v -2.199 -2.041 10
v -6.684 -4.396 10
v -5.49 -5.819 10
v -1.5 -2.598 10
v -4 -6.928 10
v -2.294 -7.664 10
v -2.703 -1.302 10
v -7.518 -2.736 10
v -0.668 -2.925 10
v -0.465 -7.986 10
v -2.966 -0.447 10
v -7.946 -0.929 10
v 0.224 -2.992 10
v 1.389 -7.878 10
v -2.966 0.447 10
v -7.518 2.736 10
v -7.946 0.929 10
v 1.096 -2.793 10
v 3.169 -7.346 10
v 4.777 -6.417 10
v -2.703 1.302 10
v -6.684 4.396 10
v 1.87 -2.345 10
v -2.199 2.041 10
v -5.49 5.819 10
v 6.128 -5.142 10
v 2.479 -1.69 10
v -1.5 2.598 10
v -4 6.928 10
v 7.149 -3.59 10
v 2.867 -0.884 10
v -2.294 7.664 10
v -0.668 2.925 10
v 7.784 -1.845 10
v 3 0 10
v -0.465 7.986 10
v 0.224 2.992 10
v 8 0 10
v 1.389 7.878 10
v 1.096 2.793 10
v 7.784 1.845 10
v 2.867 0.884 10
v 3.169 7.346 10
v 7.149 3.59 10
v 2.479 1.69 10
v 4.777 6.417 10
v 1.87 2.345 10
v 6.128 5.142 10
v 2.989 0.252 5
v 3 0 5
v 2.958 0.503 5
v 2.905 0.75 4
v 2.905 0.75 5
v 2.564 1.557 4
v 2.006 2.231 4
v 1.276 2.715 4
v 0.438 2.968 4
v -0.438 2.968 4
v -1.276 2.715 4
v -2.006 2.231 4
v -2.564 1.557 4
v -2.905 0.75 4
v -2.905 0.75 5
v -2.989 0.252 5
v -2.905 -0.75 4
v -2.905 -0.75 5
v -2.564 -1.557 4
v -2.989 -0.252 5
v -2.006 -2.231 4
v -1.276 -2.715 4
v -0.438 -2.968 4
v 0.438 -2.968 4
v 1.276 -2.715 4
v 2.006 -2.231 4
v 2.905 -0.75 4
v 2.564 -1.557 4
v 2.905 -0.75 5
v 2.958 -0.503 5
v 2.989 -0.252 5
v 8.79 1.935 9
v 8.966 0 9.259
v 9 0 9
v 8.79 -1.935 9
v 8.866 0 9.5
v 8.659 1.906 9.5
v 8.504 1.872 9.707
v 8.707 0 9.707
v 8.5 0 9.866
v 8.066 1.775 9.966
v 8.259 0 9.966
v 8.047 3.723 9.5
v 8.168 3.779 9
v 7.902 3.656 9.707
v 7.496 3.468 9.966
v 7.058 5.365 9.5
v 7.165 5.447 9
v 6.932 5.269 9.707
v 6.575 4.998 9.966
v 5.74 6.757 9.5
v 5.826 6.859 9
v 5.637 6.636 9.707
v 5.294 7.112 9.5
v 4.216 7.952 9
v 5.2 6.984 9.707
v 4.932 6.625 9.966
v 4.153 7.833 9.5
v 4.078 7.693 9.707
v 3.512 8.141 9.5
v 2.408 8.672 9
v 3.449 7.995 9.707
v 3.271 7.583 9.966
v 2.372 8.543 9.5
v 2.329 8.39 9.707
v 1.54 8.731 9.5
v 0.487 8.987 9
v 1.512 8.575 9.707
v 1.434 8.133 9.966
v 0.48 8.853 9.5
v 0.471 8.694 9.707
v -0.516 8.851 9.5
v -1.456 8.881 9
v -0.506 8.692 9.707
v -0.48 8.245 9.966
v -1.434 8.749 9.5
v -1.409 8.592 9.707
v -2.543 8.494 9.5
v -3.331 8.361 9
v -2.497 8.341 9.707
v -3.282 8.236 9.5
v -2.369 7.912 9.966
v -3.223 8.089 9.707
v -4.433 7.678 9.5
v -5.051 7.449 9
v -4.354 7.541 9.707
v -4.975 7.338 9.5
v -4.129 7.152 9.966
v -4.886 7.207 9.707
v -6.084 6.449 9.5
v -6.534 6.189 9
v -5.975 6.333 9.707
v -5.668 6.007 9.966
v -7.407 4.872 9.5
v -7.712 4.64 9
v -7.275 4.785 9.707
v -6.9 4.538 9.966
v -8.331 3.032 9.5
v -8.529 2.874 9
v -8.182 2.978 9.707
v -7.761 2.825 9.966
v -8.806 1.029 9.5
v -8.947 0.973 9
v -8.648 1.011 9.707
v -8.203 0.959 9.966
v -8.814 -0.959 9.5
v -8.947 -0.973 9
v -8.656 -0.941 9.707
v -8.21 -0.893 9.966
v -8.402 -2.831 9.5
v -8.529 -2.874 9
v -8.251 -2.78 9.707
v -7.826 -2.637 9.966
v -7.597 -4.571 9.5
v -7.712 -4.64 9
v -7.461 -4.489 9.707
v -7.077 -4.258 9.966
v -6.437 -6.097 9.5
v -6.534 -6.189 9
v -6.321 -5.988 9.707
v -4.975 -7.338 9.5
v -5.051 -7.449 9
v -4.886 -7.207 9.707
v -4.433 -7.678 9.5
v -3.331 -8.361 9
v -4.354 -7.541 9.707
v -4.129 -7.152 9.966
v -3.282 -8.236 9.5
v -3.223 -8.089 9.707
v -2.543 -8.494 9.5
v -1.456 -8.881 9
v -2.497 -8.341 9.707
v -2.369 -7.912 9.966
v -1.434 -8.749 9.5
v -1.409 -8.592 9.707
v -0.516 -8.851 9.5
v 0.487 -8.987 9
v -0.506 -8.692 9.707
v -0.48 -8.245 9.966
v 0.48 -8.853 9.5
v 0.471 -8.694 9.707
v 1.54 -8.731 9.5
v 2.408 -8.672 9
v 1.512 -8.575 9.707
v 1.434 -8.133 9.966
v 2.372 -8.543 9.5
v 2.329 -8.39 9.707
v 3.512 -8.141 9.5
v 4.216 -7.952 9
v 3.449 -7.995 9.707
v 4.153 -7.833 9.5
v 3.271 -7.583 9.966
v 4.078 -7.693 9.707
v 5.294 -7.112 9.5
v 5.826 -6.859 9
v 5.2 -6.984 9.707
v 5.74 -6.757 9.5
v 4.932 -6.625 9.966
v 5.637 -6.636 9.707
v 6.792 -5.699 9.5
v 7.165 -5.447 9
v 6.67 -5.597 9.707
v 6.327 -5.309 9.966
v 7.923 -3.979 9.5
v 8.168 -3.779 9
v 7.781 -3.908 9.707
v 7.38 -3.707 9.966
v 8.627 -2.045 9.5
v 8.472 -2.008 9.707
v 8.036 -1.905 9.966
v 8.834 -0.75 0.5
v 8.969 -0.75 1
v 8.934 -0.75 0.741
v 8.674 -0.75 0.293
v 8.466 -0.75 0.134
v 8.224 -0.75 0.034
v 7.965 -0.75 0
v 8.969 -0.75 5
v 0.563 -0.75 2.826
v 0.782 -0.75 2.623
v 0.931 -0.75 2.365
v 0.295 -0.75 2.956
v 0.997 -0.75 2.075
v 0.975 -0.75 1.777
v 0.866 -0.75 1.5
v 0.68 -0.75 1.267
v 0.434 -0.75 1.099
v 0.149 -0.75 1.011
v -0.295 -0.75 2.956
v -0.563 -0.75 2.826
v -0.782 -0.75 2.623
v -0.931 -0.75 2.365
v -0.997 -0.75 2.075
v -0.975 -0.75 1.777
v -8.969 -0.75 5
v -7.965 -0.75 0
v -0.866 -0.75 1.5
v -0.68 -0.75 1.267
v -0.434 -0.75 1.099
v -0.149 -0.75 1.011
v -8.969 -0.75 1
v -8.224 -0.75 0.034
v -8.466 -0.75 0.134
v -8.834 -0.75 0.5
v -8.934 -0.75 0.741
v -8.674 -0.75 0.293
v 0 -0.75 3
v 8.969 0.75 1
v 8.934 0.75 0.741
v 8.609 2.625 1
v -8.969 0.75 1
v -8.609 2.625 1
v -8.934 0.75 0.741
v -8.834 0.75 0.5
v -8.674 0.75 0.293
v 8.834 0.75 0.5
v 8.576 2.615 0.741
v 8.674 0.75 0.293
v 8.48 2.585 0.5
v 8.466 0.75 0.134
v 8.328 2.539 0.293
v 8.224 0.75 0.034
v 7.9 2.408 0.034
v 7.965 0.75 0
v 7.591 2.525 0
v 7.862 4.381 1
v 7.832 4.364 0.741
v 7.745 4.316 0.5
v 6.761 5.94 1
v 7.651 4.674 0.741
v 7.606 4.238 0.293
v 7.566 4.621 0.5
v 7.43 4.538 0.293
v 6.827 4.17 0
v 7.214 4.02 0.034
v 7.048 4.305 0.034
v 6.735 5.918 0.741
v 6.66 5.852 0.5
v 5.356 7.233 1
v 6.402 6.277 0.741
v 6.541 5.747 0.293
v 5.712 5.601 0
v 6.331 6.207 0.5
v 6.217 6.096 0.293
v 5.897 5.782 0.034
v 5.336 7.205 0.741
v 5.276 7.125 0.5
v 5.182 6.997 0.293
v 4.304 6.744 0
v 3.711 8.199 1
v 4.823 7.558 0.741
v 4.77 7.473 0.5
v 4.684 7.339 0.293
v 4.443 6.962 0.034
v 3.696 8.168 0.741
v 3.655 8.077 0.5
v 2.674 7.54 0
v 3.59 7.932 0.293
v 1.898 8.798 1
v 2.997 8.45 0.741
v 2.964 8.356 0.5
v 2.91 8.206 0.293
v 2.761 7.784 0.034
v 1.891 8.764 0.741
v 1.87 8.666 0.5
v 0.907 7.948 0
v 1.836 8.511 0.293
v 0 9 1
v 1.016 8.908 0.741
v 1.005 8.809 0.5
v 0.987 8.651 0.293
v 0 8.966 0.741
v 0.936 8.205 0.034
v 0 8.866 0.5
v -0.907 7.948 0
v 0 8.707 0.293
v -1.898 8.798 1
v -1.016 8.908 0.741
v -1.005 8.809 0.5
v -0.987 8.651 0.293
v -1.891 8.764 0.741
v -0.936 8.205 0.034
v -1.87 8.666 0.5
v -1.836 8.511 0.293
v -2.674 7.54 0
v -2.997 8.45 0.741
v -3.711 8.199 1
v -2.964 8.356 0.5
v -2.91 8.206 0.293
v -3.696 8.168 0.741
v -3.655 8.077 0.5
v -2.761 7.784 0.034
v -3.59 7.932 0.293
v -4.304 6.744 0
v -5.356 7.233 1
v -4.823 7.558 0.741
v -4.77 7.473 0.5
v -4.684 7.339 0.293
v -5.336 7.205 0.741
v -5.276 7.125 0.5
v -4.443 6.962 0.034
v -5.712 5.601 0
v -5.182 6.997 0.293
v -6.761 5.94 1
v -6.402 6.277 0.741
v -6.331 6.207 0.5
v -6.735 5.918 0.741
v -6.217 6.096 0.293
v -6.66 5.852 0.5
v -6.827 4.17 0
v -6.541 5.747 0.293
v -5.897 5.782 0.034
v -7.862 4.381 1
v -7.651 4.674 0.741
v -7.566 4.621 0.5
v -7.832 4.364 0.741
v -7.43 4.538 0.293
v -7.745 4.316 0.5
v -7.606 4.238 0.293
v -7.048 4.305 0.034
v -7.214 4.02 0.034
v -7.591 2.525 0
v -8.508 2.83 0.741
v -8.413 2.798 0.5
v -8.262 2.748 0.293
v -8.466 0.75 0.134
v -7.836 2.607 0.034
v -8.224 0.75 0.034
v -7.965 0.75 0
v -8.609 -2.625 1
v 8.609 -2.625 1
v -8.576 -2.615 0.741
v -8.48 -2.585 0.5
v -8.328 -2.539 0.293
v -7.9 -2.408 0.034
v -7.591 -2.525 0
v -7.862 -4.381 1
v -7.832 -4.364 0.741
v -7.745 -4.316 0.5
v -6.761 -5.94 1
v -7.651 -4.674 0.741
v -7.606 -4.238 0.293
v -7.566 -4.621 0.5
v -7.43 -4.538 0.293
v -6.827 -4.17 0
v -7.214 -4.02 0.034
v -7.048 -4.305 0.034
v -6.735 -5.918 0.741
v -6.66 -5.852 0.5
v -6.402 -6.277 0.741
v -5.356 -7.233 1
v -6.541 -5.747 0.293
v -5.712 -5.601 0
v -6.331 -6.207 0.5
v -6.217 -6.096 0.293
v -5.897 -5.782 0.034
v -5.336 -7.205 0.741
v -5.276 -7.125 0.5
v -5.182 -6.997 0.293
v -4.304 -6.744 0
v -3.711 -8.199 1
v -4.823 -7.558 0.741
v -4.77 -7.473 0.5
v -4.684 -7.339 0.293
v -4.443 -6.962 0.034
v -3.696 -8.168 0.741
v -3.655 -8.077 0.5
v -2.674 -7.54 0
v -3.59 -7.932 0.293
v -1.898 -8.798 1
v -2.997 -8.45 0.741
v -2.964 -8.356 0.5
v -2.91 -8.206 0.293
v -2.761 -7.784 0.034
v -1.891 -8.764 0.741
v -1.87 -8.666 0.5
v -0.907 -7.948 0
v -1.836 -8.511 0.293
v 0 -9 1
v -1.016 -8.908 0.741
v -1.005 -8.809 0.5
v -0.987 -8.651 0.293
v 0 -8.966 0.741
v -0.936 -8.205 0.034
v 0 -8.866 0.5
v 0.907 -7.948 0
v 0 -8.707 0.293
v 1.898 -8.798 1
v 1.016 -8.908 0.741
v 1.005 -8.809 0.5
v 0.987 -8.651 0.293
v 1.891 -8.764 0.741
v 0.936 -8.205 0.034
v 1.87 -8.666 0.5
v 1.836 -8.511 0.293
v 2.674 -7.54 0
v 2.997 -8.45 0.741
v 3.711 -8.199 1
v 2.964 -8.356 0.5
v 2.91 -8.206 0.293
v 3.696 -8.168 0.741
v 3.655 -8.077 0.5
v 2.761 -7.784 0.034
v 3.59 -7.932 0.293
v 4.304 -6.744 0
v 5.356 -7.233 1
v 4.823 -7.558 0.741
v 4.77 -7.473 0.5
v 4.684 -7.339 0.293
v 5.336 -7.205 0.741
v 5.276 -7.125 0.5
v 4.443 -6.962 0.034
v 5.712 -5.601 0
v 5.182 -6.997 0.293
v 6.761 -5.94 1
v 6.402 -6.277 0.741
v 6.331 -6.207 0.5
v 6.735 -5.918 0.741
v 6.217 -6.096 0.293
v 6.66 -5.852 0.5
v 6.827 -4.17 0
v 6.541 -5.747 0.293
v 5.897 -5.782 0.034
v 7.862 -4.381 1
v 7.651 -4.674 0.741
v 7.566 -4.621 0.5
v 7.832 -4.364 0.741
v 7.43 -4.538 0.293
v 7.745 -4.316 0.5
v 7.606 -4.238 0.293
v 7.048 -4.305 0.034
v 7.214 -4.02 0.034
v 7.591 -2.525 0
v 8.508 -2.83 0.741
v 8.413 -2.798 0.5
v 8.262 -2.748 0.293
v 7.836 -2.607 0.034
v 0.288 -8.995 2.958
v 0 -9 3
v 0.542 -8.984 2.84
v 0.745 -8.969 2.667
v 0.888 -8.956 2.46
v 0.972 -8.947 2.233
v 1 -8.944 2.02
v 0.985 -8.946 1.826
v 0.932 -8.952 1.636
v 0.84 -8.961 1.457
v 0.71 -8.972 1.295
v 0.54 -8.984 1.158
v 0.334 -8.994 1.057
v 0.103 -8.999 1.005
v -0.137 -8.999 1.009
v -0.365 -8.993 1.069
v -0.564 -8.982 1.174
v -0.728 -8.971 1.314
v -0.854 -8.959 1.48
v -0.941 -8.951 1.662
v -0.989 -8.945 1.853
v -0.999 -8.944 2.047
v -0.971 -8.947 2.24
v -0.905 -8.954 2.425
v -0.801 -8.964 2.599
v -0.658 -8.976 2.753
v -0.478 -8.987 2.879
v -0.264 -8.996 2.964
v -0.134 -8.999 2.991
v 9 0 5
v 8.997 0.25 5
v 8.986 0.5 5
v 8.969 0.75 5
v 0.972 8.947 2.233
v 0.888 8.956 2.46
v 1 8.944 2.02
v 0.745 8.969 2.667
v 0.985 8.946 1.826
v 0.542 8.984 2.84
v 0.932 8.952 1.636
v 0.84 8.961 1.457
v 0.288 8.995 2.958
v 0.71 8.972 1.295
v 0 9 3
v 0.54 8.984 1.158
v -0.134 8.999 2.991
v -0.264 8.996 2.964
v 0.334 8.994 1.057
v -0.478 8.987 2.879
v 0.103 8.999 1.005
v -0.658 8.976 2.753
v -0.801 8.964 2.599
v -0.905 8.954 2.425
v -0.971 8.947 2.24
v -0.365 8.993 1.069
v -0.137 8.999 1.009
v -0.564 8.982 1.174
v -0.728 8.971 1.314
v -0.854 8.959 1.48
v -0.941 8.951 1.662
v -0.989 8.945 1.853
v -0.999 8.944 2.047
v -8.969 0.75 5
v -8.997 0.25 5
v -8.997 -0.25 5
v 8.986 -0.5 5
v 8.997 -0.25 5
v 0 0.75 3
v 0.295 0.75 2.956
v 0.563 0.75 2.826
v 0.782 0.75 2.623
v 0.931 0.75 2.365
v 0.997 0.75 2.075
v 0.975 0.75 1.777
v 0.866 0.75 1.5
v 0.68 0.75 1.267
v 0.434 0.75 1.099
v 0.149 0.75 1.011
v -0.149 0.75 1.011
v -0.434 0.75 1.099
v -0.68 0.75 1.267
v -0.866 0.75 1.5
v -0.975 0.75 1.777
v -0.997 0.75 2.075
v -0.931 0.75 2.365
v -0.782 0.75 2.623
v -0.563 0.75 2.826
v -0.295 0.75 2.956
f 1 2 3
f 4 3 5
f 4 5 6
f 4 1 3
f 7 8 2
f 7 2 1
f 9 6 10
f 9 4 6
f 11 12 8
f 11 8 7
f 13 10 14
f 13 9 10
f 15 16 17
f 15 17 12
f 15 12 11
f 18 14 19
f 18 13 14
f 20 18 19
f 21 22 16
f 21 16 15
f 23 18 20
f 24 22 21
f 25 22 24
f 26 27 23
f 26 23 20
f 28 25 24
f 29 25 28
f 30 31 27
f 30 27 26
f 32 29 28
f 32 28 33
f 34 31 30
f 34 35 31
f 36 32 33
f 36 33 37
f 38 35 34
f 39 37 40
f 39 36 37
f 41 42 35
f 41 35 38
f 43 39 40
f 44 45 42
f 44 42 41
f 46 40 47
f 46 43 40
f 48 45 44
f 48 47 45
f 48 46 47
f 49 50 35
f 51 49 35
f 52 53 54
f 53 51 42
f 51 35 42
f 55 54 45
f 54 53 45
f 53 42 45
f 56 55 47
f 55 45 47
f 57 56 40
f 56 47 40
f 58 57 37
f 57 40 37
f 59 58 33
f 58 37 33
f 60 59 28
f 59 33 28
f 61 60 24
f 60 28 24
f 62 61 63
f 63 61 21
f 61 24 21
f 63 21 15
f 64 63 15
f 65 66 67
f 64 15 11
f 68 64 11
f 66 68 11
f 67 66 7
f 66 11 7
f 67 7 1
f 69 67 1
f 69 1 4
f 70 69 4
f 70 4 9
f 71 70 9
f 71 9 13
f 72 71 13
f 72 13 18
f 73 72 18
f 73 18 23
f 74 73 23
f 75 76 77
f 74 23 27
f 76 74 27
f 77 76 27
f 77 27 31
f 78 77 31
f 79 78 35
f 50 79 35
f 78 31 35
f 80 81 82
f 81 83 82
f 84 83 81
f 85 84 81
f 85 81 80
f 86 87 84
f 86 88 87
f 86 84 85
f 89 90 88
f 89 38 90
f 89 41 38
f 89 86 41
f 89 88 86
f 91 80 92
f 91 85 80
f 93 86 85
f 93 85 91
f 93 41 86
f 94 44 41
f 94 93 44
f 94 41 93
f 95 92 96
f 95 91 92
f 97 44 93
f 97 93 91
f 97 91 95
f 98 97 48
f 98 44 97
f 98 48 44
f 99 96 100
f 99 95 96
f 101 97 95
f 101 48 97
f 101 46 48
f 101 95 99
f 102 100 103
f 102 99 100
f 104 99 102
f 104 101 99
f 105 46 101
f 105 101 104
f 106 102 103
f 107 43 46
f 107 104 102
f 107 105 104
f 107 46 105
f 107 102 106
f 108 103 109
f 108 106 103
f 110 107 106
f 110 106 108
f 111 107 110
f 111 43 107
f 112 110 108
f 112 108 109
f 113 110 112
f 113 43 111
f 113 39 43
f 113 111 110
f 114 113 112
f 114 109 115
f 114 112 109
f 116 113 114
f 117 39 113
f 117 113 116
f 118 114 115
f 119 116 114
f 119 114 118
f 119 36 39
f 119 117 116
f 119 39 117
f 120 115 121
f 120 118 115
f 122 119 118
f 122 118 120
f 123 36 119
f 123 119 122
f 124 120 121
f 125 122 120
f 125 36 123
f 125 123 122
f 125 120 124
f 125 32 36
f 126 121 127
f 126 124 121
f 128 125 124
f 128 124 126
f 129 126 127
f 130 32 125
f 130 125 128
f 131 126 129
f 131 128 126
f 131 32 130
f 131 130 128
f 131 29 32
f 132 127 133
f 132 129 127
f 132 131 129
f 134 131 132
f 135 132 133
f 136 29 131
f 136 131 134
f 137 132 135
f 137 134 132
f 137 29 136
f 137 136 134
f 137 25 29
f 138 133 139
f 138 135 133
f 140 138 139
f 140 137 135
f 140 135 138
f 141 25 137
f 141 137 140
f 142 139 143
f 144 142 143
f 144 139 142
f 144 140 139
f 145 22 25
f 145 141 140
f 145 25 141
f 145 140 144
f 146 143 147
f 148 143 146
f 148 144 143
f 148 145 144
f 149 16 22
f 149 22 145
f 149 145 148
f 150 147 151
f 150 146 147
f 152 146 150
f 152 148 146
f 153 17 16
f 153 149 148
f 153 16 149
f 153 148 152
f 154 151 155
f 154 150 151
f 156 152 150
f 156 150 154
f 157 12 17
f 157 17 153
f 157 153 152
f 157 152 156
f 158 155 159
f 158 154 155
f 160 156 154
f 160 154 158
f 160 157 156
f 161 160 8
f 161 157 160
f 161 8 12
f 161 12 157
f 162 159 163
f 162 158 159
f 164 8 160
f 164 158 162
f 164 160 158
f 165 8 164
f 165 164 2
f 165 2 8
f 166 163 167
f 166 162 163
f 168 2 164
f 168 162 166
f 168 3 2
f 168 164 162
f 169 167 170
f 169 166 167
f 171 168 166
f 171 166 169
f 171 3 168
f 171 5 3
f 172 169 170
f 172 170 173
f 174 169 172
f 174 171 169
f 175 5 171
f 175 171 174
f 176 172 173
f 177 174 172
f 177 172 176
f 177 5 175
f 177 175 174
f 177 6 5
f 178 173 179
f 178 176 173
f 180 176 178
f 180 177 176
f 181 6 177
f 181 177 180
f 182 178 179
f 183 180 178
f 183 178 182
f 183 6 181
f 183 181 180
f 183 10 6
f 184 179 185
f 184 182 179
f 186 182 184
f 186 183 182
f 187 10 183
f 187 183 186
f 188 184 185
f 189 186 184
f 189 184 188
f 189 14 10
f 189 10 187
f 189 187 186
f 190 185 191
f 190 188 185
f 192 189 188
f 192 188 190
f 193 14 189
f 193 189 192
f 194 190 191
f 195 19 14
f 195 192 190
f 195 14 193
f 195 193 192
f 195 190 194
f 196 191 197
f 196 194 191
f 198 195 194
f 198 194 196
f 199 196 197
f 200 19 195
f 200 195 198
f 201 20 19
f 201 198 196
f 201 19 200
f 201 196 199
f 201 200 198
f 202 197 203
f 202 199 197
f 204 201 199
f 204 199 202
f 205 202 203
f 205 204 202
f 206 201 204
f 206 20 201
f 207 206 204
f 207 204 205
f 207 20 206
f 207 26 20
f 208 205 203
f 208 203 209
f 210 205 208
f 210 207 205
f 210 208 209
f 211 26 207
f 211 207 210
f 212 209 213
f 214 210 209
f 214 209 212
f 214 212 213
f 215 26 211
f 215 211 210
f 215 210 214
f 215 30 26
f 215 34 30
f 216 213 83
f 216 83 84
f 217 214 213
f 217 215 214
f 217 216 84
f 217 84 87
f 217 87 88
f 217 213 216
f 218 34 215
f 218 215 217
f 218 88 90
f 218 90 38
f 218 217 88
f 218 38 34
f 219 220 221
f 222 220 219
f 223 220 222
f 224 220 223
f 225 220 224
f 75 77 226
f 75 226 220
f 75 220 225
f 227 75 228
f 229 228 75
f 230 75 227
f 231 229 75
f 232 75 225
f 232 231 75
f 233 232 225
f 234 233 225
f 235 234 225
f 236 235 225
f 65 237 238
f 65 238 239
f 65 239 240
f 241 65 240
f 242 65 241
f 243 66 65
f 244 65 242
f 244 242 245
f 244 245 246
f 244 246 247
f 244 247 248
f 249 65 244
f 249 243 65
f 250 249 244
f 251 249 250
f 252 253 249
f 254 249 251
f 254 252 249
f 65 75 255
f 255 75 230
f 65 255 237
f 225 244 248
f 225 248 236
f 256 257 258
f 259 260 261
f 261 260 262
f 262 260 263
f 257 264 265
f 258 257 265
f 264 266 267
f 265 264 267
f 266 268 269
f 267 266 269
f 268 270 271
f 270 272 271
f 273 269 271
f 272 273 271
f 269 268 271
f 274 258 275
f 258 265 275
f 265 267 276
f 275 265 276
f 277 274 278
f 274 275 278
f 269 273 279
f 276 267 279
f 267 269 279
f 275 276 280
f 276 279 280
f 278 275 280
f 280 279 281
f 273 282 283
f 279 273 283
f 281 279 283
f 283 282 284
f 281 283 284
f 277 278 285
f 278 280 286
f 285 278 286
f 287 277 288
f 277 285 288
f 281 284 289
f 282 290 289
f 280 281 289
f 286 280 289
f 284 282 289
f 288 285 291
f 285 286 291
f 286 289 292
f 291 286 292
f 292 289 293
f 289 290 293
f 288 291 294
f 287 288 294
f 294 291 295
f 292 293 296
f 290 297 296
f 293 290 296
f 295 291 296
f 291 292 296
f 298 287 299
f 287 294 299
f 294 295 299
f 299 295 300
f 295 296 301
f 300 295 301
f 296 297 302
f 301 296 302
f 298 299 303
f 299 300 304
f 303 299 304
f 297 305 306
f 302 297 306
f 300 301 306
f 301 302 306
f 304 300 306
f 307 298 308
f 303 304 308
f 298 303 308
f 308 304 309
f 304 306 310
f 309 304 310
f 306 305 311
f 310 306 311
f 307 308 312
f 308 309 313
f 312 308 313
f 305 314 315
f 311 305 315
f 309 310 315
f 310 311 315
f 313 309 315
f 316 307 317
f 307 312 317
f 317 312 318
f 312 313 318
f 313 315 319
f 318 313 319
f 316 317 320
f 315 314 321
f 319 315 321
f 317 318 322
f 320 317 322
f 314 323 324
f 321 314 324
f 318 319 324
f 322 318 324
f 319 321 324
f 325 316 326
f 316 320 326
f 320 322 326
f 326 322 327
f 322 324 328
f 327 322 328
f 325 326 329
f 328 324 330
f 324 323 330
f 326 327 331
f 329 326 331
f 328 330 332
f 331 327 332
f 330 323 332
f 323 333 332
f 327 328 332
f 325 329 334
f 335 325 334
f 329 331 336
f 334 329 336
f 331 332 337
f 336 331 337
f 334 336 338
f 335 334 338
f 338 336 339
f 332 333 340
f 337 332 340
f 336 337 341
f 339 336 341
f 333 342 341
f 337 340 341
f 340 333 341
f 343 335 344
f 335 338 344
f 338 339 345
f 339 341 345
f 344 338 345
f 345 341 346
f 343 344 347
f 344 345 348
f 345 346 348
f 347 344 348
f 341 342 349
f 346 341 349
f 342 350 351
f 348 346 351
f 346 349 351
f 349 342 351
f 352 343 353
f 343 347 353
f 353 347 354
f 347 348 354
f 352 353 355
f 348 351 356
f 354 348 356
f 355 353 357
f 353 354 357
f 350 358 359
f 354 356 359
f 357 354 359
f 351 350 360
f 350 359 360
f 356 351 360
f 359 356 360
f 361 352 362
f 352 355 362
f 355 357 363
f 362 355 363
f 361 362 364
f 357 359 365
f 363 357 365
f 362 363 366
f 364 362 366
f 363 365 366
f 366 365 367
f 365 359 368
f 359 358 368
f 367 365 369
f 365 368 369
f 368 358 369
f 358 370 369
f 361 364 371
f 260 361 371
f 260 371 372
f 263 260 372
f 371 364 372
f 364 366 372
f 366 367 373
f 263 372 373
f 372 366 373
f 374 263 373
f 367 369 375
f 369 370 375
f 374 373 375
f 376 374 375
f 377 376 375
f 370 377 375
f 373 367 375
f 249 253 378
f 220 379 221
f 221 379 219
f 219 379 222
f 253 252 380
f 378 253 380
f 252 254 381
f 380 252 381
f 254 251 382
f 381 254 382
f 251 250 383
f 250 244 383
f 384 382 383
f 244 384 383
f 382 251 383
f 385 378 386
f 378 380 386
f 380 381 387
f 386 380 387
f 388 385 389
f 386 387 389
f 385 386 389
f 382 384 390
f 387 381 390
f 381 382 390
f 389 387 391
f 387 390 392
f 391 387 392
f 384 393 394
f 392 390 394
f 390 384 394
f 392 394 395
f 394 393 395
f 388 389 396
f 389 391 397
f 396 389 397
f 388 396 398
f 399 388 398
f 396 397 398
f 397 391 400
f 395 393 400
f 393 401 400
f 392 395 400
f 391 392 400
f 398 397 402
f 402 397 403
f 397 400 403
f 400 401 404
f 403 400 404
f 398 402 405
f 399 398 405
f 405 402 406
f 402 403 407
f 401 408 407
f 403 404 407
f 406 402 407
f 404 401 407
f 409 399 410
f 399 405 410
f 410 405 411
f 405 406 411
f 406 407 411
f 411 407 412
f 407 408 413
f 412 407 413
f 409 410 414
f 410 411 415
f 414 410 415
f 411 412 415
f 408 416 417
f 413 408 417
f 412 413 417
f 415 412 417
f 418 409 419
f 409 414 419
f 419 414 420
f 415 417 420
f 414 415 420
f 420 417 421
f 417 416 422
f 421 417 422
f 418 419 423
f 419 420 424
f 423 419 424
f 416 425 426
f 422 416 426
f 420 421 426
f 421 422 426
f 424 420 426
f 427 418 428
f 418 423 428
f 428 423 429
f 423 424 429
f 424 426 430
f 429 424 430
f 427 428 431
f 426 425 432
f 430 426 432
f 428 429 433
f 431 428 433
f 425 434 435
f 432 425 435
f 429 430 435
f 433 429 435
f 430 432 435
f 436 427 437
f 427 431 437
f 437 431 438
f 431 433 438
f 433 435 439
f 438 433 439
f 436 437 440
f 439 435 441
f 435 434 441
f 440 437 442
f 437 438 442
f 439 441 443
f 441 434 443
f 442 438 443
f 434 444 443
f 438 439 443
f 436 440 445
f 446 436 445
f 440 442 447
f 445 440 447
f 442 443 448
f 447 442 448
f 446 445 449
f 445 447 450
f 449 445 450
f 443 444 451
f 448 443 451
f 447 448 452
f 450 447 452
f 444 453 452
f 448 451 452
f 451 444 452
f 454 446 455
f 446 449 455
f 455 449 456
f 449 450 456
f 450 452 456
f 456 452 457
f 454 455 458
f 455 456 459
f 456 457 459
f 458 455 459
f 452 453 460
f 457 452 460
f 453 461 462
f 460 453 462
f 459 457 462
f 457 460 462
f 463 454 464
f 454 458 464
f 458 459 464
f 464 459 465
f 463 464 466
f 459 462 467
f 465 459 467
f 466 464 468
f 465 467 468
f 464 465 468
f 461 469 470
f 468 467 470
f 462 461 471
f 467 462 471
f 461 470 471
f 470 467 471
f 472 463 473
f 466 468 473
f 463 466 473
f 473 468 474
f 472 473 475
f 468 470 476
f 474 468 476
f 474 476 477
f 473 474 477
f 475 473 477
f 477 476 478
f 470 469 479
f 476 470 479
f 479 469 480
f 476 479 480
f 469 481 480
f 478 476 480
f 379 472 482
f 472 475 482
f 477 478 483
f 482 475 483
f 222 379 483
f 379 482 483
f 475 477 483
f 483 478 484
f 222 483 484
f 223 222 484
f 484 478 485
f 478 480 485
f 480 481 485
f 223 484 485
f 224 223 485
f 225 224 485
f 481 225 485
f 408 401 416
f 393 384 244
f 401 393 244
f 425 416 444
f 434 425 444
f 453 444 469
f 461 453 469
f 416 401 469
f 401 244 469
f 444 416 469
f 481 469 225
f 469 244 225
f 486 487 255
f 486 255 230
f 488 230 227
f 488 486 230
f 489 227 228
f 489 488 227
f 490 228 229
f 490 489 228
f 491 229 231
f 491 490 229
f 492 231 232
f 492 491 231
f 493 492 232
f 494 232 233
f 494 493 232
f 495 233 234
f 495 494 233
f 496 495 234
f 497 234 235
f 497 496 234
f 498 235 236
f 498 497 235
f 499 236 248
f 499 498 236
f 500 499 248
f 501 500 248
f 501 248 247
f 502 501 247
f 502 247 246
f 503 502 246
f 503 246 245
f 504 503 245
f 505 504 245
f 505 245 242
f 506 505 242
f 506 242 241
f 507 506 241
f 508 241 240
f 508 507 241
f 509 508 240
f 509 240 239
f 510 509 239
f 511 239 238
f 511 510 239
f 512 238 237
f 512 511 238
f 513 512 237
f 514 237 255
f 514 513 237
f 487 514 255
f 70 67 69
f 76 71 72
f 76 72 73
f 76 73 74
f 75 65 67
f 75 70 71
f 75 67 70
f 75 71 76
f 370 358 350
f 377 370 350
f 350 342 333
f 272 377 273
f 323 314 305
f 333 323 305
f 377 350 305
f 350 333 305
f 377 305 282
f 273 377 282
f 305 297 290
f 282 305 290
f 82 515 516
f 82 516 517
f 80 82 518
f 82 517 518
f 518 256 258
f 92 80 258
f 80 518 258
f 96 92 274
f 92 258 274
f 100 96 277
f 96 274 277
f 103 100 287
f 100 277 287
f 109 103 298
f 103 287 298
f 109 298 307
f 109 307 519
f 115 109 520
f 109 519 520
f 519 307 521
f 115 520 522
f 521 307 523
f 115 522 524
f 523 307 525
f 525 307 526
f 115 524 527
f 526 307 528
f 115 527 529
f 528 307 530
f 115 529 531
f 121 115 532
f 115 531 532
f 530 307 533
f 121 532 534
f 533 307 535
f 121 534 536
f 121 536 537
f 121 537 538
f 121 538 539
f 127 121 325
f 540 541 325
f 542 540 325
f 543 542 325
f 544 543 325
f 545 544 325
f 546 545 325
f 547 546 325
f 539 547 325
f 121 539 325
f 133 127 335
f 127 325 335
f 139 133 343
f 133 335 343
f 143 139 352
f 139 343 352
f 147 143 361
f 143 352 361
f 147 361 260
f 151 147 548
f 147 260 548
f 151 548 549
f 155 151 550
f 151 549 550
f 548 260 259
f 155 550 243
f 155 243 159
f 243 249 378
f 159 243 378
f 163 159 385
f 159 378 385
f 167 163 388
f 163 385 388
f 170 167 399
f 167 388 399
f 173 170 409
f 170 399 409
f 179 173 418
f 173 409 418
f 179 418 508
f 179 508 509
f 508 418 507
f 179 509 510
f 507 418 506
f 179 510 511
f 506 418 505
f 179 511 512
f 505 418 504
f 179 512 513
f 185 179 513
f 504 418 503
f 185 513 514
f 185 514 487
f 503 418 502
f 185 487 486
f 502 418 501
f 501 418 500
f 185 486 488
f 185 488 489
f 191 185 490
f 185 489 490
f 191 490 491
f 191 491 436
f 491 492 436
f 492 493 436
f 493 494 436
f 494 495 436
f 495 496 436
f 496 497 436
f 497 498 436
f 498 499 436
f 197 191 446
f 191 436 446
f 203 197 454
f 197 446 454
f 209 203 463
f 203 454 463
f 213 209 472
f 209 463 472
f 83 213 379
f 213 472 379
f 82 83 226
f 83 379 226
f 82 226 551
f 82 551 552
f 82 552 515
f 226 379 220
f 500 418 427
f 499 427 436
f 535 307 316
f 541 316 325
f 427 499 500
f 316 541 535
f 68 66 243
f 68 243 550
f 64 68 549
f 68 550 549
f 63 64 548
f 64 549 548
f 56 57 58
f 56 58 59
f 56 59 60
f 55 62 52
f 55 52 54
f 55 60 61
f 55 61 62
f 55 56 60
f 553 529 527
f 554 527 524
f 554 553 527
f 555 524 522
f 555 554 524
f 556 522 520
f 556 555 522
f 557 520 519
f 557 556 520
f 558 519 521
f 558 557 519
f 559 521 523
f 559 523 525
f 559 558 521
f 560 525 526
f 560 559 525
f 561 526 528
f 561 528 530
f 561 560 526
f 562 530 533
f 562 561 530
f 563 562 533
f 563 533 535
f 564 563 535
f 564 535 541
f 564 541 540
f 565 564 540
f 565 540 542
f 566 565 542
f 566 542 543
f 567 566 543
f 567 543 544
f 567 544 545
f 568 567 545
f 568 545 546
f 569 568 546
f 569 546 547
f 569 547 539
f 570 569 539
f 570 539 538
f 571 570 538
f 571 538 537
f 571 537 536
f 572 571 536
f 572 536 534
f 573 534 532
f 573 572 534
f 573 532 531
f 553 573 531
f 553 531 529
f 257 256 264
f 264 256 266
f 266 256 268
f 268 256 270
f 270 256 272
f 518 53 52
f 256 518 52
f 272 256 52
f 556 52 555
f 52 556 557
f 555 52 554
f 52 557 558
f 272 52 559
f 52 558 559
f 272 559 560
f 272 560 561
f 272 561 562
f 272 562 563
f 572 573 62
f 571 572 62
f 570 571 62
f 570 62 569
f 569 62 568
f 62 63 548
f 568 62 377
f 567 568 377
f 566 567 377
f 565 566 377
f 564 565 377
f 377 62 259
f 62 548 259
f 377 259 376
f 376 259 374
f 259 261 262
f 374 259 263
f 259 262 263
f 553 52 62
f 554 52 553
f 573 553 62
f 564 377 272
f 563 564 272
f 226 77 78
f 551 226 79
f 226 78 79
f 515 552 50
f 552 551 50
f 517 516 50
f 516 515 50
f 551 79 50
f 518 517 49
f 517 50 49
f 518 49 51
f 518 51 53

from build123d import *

# Parameters (mm, degrees)
SKETCH_1_R               = 9
EXTRUDE_1_DEPTH          = 10
CUT_EXTRUDE_1_DEPTH      = 17.186414056
CUT_EXTRUDE_1_DEPTH_BACK = 17.186414056
SKETCH_2_W               = 10
SKETCH_2_H               = 1.5
CUT_EXTRUDE_2_DEPTH      = 17.186414056
CUT_EXTRUDE_2_DEPTH_BACK = 17.186414056
SKETCH_3_R               = 1
FILLET_1_R               = 1
SKETCH_4_R               = 3
CUT_EXTRUDE_3_DEPTH      = 6


with BuildPart() as part:
    # 草图1 → 凸台-拉伸1 (new body)
    with BuildSketch(Plane.XY):
        Circle(SKETCH_1_R)
    extrude(amount=EXTRUDE_1_DEPTH)

    # 草图2 → 切除-拉伸1 (cut, two sides: drawn at the far end of the back side and taken through both)
    with BuildSketch(Plane(origin=(0, 0, 0), x_dir=(0, 0, -1), z_dir=(1, 0, 0)).offset(-CUT_EXTRUDE_1_DEPTH_BACK)):
        Rectangle(SKETCH_2_W, SKETCH_2_H)
    extrude(amount=CUT_EXTRUDE_1_DEPTH + CUT_EXTRUDE_1_DEPTH_BACK, mode=Mode.SUBTRACT)

    # 草图3 → 切除-拉伸2 (cut, two sides: drawn at the far end of the back side and taken through both)
    with BuildSketch(Plane(origin=(0, 0, 0), x_dir=(1, 0, 0), z_dir=(0, 1, 0)).offset(-CUT_EXTRUDE_2_DEPTH_BACK)):
        with Locations(Location((0, -2, 0), (0, 0, 270))):
            Circle(SKETCH_3_R)
    extrude(amount=CUT_EXTRUDE_2_DEPTH + CUT_EXTRUDE_2_DEPTH_BACK, mode=Mode.SUBTRACT)

    # 圆角1
    fillet_1_edges = [part.edges().sort_by_distance(p)[0] for p in [
        (-9, 0, 10),
        (0, 9, 0),
        (0, -9, 0),
    ]]
    fillet(fillet_1_edges, radius=FILLET_1_R)

    # 草图4 → 切除-拉伸3 (cut)
    with BuildSketch(Plane.XY.offset(10)):
        Circle(SKETCH_4_R)
    extrude(amount=-CUT_EXTRUDE_3_DEPTH, mode=Mode.SUBTRACT)


solid = part.part
